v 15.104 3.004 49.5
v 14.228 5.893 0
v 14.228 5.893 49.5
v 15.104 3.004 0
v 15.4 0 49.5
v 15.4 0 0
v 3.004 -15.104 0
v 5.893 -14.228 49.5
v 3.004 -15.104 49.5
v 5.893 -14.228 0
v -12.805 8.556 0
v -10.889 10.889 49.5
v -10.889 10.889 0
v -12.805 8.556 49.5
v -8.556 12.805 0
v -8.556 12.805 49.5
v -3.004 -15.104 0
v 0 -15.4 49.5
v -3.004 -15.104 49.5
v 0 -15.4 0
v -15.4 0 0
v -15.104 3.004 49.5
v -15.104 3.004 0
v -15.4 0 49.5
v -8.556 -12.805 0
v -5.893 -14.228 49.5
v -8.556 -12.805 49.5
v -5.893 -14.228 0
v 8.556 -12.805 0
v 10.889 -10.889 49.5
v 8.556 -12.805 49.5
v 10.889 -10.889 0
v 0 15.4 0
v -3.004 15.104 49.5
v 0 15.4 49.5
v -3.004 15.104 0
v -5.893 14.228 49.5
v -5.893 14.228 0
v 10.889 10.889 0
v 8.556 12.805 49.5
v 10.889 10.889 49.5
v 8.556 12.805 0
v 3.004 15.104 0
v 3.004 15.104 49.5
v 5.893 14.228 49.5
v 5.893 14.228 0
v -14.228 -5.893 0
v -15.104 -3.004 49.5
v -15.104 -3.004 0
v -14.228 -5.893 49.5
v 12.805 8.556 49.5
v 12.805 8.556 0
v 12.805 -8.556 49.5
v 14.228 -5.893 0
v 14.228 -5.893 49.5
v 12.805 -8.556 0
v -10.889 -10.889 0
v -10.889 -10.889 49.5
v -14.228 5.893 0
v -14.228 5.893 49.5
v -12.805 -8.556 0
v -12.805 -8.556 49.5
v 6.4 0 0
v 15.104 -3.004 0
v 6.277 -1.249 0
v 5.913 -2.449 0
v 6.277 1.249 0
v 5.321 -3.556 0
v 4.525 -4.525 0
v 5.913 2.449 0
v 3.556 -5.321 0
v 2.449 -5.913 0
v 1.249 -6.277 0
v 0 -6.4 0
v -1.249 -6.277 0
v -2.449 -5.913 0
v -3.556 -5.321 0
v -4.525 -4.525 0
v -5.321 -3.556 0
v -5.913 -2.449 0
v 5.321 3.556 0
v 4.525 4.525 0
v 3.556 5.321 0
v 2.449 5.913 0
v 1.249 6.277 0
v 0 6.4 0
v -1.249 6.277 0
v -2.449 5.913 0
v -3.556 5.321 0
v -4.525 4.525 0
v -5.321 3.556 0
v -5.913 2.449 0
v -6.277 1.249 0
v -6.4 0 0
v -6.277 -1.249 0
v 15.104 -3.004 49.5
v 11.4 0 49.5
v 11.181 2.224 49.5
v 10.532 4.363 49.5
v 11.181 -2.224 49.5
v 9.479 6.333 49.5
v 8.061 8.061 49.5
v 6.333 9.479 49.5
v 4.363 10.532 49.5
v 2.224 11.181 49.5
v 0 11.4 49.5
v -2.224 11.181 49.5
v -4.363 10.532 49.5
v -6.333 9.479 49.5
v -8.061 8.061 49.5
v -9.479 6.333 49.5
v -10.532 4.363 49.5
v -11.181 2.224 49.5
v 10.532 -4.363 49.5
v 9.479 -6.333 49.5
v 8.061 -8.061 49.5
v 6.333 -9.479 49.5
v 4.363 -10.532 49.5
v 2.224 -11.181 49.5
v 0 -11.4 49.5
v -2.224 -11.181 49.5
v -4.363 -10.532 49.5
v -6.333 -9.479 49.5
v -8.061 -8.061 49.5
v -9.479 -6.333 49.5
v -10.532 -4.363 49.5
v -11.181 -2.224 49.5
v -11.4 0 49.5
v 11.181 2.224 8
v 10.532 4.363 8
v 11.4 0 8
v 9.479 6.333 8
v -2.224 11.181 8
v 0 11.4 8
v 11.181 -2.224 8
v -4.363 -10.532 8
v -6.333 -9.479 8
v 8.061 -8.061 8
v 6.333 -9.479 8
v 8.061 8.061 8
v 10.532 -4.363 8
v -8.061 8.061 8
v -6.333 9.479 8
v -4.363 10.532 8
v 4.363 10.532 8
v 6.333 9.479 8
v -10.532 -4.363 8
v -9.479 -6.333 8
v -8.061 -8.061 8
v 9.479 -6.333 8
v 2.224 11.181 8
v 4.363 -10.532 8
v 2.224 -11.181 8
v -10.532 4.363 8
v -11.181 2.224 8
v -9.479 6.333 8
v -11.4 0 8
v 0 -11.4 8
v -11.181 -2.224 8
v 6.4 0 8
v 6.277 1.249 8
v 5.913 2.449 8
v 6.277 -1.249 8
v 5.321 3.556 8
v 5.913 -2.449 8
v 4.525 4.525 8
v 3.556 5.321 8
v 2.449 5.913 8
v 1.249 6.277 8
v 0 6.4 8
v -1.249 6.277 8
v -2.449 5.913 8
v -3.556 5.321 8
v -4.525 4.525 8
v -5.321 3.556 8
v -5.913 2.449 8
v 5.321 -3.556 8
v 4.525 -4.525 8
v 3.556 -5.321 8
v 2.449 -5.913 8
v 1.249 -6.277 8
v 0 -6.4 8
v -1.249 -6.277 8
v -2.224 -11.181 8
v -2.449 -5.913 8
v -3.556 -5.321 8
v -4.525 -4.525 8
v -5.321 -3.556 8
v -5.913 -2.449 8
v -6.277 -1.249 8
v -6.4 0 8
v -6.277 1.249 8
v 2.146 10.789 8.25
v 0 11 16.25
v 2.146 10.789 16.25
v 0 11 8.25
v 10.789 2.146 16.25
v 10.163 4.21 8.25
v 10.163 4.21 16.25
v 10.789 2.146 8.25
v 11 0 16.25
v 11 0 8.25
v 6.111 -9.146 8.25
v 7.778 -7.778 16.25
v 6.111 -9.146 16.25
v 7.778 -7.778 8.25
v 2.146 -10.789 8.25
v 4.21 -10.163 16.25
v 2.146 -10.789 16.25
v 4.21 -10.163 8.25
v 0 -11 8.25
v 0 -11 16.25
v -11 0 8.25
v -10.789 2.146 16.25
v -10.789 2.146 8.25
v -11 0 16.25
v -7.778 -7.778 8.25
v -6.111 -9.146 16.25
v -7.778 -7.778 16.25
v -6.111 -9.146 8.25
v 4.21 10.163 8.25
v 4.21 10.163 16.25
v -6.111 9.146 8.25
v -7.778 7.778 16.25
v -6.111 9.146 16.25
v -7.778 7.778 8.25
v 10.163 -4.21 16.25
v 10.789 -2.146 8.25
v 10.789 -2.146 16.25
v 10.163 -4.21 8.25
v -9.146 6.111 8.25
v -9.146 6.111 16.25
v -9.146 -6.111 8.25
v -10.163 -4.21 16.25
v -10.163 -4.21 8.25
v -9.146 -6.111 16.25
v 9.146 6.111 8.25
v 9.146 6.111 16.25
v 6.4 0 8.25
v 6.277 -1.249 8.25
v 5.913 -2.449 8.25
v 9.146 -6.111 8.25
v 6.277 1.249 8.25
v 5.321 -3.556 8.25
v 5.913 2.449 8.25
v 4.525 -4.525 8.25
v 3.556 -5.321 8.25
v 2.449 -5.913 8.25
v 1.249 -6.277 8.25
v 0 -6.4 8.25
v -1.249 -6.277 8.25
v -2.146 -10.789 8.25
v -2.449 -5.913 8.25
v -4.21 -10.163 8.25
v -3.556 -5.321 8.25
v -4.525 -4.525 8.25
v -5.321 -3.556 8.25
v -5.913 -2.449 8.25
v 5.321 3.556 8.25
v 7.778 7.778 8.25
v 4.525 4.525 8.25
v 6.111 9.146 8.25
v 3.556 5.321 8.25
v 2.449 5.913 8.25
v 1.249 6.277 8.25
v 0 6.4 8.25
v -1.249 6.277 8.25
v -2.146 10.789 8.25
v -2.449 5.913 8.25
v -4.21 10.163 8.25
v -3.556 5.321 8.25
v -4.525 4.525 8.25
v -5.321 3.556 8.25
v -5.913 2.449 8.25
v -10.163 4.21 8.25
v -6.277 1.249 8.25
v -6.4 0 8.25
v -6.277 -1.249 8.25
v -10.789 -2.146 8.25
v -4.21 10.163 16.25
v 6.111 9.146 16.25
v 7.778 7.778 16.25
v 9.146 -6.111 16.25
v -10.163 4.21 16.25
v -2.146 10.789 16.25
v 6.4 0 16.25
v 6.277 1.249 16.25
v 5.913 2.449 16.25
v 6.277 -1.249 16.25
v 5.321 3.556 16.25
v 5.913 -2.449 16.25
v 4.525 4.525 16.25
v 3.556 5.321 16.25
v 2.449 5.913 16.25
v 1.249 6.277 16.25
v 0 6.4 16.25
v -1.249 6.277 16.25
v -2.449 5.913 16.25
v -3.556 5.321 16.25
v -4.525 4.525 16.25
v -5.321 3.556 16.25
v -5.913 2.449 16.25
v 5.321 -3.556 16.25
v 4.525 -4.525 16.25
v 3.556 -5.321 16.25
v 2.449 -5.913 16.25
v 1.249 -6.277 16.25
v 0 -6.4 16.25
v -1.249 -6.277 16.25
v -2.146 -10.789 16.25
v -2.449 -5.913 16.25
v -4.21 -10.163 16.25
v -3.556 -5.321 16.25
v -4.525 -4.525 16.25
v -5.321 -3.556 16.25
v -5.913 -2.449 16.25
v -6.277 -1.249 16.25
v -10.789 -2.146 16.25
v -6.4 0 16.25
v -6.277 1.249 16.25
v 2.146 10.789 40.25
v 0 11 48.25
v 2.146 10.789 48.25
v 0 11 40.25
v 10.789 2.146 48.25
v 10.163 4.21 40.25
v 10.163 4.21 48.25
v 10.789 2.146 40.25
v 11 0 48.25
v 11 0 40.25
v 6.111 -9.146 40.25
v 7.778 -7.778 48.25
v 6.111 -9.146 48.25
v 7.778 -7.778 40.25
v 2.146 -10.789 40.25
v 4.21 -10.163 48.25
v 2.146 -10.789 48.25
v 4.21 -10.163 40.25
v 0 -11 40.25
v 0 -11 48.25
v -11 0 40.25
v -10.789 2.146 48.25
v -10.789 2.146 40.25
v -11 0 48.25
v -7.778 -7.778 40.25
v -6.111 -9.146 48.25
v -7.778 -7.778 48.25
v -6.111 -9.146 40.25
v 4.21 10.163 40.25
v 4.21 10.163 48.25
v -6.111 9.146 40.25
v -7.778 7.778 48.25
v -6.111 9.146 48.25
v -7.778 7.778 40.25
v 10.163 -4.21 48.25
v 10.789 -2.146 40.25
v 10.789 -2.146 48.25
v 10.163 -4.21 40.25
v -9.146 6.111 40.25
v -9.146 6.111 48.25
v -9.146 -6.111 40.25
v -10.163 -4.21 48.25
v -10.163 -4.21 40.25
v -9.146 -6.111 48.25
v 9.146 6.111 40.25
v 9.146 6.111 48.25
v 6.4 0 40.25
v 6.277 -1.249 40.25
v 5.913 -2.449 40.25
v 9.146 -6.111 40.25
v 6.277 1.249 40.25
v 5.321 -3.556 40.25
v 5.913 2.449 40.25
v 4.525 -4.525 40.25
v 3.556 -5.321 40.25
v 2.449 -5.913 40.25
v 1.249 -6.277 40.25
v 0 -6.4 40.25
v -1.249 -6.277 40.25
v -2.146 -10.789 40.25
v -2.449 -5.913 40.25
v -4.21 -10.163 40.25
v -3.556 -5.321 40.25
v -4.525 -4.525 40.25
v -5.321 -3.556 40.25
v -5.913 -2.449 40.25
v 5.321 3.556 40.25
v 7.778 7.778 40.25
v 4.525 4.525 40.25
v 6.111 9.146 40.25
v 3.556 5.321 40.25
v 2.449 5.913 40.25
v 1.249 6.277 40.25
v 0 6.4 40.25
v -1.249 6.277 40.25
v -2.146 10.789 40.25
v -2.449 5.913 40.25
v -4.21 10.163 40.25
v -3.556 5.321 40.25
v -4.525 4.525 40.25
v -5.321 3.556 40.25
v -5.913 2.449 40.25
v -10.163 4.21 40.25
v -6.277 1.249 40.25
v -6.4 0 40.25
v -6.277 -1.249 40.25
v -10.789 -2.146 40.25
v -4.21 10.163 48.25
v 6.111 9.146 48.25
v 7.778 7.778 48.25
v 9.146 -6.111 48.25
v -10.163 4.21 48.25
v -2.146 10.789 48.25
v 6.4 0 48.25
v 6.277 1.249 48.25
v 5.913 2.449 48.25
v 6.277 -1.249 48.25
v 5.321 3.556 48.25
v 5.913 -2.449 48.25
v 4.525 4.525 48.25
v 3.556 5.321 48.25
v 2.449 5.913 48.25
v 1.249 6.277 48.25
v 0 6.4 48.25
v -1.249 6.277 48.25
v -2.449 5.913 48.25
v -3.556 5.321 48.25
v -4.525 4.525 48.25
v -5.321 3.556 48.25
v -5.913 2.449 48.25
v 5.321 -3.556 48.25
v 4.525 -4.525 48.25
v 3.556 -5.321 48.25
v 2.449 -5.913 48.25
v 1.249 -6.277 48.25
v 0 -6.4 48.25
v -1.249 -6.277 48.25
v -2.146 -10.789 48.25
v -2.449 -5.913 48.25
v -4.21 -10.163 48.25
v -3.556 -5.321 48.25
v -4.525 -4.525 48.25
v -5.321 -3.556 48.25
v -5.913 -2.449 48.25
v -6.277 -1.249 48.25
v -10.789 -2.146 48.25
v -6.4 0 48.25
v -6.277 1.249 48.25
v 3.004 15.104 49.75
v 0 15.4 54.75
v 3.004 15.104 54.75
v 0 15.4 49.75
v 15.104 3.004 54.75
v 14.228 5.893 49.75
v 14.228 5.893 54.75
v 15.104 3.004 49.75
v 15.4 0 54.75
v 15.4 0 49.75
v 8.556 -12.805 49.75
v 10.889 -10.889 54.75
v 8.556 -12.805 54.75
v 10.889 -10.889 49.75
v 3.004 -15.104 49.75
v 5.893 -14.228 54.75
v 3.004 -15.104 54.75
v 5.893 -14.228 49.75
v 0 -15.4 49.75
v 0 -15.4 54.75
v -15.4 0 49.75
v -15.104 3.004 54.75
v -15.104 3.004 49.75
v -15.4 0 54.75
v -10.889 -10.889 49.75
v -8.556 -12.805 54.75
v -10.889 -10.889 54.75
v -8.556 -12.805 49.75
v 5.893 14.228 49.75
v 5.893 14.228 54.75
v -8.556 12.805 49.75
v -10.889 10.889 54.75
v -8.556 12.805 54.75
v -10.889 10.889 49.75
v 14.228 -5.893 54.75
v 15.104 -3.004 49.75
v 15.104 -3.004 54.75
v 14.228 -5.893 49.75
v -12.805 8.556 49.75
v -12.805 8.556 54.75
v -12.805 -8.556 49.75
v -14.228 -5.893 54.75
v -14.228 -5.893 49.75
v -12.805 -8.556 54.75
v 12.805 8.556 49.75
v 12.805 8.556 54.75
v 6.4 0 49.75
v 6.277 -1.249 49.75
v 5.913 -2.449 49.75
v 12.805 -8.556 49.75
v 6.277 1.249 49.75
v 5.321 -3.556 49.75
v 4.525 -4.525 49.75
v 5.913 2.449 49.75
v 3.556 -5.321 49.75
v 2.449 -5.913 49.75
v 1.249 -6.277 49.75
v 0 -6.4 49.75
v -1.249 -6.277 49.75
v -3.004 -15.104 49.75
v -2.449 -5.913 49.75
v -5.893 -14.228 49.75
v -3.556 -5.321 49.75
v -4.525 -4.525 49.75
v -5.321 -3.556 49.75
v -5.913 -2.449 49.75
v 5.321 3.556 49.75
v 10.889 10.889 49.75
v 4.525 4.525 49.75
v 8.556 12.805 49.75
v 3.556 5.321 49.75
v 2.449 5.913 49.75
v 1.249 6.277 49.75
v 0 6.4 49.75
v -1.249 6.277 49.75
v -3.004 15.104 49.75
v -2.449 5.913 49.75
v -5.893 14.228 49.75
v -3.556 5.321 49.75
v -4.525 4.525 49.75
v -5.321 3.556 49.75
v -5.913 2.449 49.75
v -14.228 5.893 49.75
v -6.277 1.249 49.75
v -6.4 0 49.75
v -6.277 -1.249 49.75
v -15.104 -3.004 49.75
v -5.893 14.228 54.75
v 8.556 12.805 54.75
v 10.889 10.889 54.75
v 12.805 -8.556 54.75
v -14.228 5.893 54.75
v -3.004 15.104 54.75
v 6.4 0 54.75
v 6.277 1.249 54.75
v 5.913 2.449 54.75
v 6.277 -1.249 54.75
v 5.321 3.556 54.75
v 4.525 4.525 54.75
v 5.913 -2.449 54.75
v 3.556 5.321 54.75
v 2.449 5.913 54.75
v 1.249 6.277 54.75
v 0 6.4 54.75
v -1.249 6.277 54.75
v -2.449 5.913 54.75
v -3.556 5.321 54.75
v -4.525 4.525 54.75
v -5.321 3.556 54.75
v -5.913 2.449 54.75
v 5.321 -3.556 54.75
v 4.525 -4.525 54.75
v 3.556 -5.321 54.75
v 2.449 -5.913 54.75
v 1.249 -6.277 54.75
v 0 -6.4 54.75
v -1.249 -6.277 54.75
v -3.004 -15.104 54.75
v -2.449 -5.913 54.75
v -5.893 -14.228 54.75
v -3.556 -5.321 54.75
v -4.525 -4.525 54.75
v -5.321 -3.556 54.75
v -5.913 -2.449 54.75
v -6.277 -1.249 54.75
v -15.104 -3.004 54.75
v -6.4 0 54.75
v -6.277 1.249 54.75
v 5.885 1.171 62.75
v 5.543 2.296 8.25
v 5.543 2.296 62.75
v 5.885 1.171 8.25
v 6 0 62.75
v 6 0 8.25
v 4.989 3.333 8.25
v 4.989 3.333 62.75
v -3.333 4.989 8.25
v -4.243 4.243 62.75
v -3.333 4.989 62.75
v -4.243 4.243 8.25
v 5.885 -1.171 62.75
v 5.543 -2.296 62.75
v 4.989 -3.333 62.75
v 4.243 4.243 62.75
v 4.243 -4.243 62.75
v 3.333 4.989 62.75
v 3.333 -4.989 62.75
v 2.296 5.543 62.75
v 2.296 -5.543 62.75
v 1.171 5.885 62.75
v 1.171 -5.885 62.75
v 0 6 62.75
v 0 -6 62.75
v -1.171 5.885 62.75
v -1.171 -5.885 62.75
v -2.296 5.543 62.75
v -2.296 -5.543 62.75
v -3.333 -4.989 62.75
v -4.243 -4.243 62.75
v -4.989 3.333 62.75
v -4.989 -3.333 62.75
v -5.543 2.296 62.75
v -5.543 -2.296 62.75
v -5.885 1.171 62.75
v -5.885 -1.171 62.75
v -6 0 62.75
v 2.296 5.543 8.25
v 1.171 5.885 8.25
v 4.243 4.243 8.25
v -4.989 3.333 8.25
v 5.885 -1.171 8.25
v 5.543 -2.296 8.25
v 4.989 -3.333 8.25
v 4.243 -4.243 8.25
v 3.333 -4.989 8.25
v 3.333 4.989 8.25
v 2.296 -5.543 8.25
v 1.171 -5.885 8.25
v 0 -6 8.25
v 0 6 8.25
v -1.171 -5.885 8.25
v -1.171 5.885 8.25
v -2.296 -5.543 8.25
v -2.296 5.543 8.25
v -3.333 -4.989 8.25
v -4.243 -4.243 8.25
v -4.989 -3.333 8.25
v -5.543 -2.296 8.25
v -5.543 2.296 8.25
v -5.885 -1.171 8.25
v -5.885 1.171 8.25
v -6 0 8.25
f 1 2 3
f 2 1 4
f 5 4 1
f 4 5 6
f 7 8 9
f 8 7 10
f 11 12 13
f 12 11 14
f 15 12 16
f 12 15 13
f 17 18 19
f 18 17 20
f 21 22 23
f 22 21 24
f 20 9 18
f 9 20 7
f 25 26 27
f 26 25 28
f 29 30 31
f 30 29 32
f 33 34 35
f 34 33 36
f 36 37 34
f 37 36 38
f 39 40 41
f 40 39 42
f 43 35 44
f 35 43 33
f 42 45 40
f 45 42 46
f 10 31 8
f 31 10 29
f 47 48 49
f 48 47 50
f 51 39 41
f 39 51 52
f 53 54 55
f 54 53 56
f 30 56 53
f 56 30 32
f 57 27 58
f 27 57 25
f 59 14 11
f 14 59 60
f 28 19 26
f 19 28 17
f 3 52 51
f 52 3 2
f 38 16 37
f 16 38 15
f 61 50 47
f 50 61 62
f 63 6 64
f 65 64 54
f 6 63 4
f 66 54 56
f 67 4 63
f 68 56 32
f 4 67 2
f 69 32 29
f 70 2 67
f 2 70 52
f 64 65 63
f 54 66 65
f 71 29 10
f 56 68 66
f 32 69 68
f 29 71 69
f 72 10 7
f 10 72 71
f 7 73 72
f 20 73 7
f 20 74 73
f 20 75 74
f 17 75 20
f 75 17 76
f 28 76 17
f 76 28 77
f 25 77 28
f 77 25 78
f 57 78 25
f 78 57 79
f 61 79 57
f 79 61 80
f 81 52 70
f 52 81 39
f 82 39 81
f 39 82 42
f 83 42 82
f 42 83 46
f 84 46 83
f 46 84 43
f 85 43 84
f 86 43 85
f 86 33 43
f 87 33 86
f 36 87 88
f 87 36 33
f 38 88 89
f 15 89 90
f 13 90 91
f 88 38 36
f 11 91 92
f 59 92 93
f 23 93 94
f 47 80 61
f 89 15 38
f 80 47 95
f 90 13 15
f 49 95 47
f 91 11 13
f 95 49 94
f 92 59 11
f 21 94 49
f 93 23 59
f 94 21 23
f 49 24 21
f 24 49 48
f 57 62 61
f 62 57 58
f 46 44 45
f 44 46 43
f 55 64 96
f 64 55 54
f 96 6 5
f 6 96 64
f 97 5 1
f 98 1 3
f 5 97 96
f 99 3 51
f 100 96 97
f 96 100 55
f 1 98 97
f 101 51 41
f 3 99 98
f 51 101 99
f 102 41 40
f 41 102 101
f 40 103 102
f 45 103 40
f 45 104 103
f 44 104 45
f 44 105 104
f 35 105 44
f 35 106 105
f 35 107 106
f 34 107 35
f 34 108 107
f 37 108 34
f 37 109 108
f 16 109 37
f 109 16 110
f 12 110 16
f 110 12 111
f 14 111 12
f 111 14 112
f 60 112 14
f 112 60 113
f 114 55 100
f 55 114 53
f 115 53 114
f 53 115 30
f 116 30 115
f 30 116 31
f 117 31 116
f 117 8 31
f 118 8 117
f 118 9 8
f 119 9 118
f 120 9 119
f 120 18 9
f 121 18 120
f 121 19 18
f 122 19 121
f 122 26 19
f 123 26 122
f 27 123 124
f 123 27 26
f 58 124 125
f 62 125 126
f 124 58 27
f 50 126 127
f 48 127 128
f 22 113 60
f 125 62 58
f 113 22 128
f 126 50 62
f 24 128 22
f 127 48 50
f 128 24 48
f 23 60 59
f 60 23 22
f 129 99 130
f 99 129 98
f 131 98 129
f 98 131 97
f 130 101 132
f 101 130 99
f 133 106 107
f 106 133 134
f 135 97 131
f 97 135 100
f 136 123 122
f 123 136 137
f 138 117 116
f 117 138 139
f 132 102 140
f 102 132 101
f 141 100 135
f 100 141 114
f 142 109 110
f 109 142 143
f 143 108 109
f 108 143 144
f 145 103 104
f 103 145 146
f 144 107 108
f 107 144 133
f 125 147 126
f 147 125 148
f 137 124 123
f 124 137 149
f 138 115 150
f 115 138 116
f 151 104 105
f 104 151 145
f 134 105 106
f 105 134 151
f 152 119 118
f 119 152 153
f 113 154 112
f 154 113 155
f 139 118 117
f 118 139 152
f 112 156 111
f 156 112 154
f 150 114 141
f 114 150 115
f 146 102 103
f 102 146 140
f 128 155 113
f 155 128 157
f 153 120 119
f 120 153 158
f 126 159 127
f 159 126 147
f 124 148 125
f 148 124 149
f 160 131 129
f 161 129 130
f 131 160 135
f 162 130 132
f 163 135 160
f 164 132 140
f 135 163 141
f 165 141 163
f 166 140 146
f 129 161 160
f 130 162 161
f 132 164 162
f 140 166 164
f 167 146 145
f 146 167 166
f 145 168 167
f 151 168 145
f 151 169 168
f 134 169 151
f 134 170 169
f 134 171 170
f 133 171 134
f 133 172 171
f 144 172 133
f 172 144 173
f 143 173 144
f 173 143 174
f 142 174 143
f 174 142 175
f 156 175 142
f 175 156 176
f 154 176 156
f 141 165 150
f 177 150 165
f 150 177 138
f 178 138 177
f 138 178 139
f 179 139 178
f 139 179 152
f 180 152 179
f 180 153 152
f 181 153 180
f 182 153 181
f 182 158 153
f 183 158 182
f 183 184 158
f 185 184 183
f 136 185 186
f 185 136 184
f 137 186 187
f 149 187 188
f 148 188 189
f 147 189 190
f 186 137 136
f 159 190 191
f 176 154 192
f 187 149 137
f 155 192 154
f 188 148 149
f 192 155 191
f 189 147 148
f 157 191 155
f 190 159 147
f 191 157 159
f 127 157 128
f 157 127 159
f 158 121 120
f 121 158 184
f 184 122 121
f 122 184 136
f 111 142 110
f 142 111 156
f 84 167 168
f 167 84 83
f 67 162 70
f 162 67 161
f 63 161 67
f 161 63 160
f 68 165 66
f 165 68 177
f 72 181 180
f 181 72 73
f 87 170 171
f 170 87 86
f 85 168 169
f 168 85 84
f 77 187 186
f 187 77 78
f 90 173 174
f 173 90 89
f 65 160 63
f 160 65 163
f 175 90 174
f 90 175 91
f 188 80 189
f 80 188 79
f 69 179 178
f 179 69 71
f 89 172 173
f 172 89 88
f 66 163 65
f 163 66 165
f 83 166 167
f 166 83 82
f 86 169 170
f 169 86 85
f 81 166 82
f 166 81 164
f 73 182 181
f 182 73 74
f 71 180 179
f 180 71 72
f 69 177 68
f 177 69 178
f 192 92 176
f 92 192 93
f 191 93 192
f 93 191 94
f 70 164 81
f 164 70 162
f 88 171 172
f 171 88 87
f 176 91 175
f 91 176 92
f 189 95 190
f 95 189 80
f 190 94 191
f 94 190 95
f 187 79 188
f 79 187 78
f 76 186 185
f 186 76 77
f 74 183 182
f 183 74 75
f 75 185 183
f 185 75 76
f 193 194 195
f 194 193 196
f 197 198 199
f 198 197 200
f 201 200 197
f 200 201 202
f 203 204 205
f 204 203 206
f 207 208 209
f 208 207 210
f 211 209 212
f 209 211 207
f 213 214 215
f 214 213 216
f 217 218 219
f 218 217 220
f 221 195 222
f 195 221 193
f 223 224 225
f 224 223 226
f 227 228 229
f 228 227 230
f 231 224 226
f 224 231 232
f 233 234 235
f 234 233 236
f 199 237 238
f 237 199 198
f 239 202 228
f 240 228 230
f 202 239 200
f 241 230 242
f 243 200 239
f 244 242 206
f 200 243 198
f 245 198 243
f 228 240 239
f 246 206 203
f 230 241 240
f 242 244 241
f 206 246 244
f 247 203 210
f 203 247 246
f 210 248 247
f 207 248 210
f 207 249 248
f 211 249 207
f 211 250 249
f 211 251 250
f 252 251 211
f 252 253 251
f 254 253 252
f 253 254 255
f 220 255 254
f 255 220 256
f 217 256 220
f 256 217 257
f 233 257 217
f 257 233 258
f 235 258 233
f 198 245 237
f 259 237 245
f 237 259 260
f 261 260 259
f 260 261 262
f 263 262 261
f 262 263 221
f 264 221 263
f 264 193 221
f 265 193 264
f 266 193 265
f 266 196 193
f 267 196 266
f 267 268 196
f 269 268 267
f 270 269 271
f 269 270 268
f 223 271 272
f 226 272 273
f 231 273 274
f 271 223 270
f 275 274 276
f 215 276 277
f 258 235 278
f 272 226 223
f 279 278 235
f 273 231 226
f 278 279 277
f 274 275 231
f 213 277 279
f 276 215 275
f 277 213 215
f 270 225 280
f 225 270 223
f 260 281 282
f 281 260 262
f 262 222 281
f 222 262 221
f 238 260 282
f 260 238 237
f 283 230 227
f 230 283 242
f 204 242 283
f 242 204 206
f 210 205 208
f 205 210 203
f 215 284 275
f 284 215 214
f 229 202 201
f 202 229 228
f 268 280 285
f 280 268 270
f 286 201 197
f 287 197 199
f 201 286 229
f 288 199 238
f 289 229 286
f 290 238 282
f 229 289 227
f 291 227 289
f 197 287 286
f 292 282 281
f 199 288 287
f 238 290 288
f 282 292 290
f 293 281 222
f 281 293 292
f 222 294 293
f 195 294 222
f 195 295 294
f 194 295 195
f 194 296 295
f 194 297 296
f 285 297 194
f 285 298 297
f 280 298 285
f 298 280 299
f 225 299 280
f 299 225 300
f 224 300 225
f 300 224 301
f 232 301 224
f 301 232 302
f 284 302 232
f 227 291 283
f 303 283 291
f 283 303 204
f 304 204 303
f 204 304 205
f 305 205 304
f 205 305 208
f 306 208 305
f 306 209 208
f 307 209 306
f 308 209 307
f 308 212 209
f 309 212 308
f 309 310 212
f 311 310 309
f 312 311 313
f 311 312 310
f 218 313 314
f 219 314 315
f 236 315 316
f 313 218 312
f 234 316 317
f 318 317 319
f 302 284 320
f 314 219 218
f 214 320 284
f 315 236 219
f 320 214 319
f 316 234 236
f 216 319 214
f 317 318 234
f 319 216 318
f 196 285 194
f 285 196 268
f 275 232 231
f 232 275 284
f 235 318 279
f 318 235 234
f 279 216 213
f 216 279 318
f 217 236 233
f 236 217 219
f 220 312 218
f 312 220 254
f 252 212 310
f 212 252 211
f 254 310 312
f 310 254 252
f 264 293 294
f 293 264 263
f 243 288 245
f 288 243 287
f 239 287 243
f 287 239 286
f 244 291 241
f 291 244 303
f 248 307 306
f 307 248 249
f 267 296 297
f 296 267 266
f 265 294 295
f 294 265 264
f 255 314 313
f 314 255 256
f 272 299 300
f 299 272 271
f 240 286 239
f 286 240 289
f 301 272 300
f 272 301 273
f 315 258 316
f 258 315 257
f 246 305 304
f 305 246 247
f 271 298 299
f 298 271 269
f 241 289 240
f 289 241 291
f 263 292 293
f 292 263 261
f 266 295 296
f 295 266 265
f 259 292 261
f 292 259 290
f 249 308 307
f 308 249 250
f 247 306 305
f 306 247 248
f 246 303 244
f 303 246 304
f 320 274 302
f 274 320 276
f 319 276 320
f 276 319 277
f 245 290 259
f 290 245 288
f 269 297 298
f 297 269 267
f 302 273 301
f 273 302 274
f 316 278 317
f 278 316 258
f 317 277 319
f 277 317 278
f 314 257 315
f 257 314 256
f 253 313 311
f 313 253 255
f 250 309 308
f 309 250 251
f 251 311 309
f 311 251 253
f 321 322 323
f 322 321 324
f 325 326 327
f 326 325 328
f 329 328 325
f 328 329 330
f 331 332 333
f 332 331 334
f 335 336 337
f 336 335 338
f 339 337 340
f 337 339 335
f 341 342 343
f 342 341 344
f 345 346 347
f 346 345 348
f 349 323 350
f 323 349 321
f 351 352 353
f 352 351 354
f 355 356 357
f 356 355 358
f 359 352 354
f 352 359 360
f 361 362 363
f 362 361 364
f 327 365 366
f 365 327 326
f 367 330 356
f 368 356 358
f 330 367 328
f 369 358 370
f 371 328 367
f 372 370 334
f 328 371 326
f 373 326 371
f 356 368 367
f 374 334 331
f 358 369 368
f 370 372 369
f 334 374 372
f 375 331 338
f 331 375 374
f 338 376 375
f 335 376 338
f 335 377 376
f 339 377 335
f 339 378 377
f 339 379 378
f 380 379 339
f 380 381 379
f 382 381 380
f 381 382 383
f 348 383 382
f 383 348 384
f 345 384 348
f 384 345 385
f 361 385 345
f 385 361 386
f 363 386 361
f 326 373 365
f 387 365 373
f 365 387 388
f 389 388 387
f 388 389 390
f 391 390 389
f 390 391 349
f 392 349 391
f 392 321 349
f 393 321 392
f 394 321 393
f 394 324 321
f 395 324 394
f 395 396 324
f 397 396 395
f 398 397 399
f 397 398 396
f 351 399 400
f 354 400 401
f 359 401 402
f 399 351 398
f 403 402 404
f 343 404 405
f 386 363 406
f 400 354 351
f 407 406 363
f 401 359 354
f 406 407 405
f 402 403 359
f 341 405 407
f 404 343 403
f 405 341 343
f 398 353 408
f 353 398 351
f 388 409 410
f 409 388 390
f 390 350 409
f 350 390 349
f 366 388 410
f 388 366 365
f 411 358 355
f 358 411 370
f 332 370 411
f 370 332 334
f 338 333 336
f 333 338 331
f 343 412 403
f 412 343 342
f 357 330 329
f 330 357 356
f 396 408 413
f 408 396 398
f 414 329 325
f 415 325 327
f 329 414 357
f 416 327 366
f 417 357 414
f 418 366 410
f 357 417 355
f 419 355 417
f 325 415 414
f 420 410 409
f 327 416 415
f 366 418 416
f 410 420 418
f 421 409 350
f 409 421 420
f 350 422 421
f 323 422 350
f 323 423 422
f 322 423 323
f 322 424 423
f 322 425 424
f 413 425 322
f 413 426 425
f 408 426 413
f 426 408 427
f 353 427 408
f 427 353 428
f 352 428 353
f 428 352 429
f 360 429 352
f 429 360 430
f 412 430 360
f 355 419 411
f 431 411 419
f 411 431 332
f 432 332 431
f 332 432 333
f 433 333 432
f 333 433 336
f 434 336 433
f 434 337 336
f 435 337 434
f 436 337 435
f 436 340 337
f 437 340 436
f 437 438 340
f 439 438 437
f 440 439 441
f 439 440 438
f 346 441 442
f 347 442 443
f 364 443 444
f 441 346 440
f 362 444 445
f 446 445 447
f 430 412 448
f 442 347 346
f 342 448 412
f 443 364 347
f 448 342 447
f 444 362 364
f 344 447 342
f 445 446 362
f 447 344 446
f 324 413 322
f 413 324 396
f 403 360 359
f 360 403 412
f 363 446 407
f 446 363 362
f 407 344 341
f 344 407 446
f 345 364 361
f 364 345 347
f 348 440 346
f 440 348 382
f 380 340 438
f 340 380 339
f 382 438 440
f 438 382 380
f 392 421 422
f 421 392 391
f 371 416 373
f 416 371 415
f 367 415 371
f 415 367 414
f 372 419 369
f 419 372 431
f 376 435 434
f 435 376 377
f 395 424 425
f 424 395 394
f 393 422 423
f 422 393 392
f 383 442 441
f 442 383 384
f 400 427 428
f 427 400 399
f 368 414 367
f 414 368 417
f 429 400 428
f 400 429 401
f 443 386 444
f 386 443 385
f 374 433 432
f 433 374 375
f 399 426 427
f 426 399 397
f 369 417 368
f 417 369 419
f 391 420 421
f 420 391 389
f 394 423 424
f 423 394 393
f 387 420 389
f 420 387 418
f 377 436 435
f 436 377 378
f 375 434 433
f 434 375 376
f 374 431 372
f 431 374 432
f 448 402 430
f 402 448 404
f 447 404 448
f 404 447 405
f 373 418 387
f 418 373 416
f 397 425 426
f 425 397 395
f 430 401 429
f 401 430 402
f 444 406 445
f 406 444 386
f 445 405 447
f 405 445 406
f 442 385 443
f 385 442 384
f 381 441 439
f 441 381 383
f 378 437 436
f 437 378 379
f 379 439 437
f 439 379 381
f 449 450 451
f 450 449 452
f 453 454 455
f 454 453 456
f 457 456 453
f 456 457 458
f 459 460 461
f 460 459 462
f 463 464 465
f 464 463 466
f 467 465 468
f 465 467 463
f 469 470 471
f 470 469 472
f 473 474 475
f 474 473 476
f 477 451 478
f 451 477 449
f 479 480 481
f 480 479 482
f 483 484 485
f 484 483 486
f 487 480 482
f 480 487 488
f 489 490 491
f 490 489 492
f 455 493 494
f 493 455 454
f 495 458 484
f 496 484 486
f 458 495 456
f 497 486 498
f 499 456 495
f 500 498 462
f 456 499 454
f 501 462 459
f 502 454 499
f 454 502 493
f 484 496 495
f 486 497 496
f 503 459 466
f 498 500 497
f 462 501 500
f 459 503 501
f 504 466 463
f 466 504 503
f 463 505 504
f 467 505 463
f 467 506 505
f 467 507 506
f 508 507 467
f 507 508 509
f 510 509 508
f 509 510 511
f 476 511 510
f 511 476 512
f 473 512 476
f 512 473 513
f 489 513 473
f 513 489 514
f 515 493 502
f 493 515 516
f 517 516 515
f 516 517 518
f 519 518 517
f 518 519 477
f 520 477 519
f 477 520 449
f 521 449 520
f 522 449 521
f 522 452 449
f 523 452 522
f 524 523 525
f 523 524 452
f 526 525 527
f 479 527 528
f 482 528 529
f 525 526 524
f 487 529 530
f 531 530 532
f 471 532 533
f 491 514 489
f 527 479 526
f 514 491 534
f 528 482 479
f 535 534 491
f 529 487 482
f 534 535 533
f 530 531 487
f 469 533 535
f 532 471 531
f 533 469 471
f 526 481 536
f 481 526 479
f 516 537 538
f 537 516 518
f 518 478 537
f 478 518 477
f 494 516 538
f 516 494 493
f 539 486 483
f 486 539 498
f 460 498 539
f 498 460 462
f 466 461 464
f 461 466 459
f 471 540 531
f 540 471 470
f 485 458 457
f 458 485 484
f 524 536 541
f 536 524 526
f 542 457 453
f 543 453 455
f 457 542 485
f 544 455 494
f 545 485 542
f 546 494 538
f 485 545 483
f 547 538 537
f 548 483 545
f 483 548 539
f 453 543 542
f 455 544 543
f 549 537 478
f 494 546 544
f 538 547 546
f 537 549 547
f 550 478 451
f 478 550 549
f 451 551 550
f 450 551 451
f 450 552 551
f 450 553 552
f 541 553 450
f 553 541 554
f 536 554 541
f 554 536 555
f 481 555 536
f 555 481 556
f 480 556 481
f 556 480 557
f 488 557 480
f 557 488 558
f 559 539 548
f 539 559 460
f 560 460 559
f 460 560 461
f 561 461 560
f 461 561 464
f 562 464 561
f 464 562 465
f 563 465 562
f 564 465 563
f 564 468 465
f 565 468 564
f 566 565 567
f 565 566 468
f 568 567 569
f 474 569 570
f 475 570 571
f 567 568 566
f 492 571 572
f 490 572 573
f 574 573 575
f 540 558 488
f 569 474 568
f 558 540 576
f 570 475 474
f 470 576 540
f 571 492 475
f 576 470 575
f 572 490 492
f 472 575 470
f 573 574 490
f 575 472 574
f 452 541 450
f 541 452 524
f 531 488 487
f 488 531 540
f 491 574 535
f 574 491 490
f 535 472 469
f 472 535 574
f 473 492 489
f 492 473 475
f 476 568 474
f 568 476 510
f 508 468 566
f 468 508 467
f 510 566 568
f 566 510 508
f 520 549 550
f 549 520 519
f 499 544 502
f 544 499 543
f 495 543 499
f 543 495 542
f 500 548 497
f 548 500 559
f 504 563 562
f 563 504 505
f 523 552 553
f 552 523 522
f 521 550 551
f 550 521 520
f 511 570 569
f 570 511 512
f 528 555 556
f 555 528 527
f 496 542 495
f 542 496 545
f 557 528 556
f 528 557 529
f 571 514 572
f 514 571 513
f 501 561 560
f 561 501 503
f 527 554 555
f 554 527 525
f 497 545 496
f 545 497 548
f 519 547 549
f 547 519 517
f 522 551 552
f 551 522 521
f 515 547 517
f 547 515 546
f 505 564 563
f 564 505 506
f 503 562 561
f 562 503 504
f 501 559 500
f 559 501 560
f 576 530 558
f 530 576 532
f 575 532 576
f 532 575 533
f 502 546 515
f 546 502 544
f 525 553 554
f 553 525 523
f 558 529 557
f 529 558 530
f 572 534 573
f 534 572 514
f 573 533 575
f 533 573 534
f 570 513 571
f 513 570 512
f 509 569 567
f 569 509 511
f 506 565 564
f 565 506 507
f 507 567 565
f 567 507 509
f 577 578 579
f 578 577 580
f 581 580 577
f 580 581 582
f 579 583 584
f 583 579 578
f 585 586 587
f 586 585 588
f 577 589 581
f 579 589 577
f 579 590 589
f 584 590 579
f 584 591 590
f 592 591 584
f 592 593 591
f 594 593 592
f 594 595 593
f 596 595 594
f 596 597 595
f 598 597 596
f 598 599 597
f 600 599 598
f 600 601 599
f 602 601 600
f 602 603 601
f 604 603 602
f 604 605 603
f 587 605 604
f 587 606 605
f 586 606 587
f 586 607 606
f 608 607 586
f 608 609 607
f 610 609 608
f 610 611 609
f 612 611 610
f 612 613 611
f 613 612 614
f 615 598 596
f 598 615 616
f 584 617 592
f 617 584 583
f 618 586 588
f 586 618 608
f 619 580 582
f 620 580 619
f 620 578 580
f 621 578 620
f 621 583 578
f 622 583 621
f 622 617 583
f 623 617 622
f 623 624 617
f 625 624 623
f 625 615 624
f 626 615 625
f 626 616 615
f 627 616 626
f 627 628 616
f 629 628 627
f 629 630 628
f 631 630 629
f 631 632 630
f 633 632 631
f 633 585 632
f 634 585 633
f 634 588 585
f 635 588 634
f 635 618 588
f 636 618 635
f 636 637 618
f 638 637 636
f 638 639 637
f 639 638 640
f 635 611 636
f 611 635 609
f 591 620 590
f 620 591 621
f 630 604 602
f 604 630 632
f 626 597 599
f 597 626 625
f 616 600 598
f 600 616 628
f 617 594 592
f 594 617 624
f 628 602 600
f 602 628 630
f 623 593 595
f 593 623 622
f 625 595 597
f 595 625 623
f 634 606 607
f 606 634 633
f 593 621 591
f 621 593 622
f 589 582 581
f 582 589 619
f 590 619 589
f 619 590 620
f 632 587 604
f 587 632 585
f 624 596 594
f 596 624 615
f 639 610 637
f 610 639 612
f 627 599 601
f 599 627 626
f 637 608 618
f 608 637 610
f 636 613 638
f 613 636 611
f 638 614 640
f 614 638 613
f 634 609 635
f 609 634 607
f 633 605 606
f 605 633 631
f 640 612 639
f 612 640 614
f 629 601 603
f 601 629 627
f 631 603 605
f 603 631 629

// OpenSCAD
$fn = 32;

// ------------------------------------------------------------------------
// Shaft station: cup d30.8 x 49.5 mm, shaft d12
// Every part is its own module, assembly() places every instance.
// ------------------------------------------------------------------------

// --- part 1 ---
module housing_cup() {
  difference() {
    cylinder(h = 49.5, d = 30.8);
    translate([0, 0, 8]) cylinder(h = 42.5, d = 22.8);
    translate([0, 0, -1]) cylinder(h = 10, d = 12.8);
  }
}

// --- part 2 ---
module bearing_lower() {
  difference() {
      translate([0, 0, 0]) cylinder(h = 8, d = 22);
      translate([0, 0, -1]) cylinder(h = 10, d = 12.8);
    }
}

// --- part 3 ---
module bearing_upper() {
  difference() {
      translate([0, 0, 0]) cylinder(h = 8, d = 22);
      translate([0, 0, -1]) cylinder(h = 10, d = 12.8);
    }
}

// --- part 4 ---
module station_shaft() {
  translate([0, 0, -27.25]) cylinder(h = 54.5, d = 12);
}

// --- part 5 ---
module station_cover() {
  difference() {
    cylinder(h = 5, d = 30.8);
    translate([0, 0, -1]) cylinder(h = 7, d = 12.8);
  }
}

// --- assembly ---
module assembly() {
  color([0.80, 0.24, 0.20]) translate([0, 0, 0]) rotate([0, 0, 0]) housing_cup();
  color([0.20, 0.45, 0.75]) translate([0, 0, 8.25]) rotate([0, 0, 0]) bearing_lower();
  color([0.25, 0.62, 0.32]) translate([0, 0, 40.25]) rotate([0, 0, 0]) bearing_upper();
  color([0.92, 0.70, 0.18]) translate([0, 0, 35.5]) rotate([0, 0, 0]) station_shaft();
  color([0.58, 0.35, 0.70]) translate([0, 0, 49.75]) rotate([0, 0, 0]) station_cover();
}

assembly();
